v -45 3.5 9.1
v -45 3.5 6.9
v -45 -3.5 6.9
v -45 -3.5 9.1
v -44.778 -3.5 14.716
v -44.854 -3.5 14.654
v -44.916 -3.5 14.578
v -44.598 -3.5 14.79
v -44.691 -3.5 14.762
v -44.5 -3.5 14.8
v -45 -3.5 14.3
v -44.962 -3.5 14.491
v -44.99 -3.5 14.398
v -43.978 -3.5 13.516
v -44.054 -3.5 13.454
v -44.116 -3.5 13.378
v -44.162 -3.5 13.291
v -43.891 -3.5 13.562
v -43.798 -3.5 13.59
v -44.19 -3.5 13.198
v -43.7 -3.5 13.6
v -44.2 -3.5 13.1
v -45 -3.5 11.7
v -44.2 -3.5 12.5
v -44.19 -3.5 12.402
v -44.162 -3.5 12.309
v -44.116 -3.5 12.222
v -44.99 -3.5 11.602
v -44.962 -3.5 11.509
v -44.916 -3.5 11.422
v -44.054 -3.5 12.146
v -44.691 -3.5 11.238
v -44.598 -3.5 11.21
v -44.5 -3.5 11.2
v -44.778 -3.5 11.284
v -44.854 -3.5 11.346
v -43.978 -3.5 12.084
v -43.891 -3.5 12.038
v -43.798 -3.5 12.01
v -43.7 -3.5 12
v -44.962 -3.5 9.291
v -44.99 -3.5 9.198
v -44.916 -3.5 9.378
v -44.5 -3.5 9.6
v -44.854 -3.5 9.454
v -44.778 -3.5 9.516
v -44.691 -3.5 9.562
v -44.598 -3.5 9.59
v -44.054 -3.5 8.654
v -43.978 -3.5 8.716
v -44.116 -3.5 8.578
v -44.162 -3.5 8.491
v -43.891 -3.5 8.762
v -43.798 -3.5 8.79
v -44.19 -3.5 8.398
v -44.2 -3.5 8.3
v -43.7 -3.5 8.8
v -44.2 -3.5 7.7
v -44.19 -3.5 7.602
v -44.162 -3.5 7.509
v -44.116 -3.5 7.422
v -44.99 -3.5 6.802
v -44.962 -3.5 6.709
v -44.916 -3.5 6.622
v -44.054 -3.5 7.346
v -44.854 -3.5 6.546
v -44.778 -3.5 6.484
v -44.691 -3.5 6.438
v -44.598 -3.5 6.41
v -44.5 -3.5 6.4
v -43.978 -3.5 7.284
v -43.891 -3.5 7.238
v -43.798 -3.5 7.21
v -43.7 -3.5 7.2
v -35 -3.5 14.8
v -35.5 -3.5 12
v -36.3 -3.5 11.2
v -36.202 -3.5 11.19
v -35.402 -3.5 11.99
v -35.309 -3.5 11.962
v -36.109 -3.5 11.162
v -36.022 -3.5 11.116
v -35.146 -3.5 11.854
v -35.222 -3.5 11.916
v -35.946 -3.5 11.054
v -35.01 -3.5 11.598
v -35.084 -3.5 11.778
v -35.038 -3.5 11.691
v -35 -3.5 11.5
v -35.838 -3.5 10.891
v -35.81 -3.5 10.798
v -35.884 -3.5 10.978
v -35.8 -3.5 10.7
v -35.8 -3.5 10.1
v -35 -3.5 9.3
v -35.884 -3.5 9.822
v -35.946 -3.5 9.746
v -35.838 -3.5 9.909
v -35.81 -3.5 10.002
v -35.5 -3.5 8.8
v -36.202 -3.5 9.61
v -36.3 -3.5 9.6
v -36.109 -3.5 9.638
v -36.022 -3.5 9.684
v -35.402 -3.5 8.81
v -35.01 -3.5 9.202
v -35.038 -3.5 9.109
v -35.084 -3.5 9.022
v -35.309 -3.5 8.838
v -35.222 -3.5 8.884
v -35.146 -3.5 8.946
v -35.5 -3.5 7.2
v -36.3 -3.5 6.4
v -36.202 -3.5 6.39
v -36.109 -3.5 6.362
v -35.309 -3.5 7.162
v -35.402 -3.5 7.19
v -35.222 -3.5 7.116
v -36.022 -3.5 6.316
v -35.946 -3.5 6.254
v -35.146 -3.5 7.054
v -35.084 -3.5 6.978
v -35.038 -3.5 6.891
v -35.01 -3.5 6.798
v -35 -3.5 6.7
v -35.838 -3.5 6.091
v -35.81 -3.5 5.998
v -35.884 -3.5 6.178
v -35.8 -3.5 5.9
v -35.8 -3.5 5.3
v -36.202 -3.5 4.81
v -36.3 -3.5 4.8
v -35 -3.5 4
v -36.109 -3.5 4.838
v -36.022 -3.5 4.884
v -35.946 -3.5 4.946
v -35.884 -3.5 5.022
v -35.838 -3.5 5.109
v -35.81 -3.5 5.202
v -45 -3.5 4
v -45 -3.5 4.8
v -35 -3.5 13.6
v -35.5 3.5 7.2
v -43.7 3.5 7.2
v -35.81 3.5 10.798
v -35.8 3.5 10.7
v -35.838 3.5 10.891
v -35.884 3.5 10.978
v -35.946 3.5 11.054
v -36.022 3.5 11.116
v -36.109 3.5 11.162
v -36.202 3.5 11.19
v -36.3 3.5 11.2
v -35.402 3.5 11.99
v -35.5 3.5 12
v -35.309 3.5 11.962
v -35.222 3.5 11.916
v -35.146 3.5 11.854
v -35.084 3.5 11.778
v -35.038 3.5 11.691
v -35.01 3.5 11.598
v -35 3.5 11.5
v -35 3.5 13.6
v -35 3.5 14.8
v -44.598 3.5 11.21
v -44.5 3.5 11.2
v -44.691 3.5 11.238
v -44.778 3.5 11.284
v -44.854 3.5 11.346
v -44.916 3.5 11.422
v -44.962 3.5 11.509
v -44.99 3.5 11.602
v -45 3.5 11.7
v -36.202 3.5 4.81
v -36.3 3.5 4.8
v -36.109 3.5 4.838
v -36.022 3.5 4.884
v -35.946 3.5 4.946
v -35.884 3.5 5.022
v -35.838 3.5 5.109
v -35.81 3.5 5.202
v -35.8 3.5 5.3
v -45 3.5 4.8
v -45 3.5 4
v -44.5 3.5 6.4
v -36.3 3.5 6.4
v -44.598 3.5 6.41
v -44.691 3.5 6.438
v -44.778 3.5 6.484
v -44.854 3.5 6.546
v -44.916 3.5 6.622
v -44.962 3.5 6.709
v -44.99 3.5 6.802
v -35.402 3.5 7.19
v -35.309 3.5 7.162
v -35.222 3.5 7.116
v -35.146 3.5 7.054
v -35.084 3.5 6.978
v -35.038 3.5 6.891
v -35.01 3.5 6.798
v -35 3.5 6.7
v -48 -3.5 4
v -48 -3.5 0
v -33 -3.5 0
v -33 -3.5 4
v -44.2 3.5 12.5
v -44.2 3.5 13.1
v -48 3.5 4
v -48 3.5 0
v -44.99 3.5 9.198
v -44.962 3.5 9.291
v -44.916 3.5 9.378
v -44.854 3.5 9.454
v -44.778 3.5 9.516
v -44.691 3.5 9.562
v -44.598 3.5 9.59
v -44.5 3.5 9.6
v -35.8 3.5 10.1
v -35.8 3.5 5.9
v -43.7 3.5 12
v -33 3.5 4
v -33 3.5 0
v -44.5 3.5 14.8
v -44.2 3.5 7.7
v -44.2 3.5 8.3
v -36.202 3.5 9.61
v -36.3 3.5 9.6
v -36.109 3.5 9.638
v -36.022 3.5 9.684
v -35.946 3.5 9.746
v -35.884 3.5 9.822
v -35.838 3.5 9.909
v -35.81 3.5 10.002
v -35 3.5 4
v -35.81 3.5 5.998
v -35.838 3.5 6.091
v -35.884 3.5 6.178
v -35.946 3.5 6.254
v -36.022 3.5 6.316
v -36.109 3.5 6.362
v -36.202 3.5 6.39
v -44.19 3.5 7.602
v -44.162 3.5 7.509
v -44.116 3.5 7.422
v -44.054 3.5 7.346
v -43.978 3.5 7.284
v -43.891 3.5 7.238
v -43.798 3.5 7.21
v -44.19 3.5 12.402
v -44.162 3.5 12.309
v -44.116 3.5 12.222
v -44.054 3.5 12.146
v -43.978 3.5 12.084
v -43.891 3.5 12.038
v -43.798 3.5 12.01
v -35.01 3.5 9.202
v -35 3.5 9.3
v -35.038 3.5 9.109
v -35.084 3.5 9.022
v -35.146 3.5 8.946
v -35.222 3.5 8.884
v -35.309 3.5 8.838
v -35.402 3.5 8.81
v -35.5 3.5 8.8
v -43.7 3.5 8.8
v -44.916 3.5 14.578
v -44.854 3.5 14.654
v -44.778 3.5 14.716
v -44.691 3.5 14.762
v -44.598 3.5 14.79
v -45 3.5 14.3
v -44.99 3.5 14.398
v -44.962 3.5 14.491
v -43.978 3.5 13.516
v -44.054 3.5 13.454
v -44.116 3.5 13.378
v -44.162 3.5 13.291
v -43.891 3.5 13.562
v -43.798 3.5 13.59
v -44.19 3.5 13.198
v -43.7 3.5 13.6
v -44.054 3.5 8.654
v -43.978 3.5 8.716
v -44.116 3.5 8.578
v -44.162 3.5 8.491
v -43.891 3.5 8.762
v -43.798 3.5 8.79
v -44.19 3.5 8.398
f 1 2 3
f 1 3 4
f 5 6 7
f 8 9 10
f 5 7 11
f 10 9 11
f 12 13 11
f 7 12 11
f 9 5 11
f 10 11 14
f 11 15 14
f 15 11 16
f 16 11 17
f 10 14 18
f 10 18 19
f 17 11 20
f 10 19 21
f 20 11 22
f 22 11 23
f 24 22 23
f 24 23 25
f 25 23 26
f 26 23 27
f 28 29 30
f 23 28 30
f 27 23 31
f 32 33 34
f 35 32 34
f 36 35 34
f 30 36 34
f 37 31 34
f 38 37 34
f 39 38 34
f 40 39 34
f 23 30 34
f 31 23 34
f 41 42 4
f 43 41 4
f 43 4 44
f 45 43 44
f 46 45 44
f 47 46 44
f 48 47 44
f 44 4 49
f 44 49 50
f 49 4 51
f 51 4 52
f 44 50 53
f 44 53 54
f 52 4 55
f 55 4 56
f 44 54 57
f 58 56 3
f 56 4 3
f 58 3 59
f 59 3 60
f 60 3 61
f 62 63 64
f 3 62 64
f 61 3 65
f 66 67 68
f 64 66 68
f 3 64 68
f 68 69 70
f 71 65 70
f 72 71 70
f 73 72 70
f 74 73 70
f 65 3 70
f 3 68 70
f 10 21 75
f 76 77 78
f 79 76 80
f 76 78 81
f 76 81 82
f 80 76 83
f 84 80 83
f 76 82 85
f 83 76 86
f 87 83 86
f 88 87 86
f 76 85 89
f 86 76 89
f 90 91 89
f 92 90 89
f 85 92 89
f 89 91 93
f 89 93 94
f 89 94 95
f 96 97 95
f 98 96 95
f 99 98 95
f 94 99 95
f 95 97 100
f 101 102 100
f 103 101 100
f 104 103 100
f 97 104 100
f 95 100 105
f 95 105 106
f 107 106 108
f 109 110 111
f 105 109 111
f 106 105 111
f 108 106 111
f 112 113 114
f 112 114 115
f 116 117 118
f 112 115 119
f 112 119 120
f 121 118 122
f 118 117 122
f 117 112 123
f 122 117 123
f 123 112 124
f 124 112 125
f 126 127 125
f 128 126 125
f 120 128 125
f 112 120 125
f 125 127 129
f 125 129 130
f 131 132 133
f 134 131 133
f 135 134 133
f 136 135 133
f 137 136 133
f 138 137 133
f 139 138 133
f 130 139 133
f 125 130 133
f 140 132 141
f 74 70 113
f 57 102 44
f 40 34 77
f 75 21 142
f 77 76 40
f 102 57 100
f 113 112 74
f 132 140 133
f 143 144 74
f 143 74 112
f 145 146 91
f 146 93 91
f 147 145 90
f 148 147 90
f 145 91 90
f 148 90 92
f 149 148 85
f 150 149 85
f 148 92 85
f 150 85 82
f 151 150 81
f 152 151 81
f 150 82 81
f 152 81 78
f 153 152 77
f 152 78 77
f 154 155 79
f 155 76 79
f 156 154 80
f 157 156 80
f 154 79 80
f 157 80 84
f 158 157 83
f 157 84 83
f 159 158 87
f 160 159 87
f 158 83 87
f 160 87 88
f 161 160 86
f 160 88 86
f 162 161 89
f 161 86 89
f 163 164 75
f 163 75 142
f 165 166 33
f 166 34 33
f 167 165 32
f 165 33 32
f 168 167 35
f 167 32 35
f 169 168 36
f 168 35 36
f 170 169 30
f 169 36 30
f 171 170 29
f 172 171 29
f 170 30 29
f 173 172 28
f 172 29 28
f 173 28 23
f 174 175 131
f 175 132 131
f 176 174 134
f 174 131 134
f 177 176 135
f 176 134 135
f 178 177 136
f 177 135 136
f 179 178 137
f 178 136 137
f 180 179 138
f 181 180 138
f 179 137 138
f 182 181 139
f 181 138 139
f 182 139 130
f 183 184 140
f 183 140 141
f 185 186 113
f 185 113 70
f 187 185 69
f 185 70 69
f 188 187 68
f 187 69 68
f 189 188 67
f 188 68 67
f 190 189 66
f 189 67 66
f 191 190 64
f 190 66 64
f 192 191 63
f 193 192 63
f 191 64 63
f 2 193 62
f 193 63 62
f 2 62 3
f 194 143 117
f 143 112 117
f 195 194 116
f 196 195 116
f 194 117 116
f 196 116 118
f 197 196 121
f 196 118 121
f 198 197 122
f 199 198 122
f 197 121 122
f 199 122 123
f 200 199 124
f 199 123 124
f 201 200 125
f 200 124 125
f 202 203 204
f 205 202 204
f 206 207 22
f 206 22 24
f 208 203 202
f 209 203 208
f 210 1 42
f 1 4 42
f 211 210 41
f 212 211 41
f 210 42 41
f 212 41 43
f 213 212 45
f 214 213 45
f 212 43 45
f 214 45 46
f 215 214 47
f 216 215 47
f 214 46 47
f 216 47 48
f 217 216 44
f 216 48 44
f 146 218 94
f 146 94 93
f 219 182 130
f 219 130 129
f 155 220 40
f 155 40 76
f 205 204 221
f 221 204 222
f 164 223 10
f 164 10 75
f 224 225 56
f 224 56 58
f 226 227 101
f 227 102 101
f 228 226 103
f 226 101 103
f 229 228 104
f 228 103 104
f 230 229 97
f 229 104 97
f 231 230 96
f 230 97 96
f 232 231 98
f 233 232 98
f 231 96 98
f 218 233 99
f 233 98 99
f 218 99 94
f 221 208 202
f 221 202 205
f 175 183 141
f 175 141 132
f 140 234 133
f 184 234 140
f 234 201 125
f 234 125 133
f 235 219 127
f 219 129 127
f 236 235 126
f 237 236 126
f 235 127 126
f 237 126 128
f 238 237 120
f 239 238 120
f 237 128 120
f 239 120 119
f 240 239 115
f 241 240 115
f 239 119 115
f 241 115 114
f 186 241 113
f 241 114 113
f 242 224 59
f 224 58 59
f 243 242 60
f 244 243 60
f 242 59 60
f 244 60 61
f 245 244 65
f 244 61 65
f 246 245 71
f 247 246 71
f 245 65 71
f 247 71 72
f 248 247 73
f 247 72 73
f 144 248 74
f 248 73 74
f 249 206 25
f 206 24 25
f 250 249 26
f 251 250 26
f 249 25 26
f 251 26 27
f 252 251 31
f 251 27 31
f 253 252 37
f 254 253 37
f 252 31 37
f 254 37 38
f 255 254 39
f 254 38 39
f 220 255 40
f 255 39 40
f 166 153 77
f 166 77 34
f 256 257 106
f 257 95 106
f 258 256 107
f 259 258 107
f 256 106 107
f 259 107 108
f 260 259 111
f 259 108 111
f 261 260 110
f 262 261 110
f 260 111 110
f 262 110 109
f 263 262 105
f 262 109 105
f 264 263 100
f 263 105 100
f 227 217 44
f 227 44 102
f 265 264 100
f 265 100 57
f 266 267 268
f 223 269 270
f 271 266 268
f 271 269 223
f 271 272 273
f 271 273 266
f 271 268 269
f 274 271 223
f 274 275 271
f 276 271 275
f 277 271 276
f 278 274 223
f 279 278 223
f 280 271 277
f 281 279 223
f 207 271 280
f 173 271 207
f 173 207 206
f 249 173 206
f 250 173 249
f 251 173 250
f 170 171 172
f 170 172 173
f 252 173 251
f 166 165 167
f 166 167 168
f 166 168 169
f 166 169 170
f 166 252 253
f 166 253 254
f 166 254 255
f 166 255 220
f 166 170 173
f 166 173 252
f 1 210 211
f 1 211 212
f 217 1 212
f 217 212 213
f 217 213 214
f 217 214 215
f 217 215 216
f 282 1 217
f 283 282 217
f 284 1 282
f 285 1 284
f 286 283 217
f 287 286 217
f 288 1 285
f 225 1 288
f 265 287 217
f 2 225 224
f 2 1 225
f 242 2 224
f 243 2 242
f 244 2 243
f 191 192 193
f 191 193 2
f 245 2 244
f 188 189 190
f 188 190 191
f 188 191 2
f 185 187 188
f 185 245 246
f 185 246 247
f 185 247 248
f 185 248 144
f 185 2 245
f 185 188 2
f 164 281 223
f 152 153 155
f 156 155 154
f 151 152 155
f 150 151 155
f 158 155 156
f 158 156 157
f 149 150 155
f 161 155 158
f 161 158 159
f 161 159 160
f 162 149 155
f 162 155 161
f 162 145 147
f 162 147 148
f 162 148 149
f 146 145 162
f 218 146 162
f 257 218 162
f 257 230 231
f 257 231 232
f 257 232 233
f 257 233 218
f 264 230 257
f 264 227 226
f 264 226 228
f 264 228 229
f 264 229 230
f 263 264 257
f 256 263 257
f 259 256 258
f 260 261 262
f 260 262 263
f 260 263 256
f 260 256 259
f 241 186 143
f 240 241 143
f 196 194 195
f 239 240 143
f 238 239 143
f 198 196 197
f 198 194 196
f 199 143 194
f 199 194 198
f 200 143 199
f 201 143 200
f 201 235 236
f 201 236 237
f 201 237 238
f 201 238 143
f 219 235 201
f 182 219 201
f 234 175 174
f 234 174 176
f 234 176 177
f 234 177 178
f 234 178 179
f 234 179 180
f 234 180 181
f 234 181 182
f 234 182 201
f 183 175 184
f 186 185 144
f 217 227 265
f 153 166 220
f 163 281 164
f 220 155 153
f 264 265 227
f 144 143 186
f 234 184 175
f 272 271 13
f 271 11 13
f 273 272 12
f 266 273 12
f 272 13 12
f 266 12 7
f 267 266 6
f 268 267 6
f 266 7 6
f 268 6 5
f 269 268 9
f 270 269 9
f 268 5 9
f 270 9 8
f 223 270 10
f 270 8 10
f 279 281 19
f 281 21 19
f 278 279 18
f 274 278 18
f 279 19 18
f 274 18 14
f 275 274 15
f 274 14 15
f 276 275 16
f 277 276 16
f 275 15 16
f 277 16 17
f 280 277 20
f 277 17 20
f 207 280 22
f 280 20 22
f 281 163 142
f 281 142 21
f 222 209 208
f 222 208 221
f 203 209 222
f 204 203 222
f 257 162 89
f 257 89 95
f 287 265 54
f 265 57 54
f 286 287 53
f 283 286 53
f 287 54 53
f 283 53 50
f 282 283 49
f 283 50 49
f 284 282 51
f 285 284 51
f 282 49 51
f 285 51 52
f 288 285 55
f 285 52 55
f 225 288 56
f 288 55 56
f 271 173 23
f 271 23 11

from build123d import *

# Parameters (mm, degrees)
SKETCH_1_W      = 15
SKETCH_1_H      = 7
EXTRUDE_1_DEPTH = 4
EXTRUDE_2_DEPTH = 7
FILLET_1_R      = 0.5


with BuildPart() as part:
    # 스케치1 → 보스-돌출1 (new body)
    with BuildSketch(Plane.XY):
        with Locations((-40.5, 0)):
            Rectangle(SKETCH_1_W, SKETCH_1_H)
    extrude(amount=EXTRUDE_1_DEPTH)


with BuildPart() as body_2:
    # 스케치2 → 보스-돌출2 (new body)
    with BuildSketch(Plane(origin=(0, 3.5, 0), x_dir=(1, 0, 0), z_dir=(0, 1, 0))):
        Polygon((-35, -4), (-45, -4), (-45, -4.8), (-35.8, -4.8), (-35.8, -6.4), (-45, -6.4), (-45, -9.6), (-35.8, -9.6), (-35.8, -11.2), (-45, -11.2), (-45, -12), (-45, -14.8), (-35, -14.8), (-35, -13.6), (-44.2, -13.6), (-44.2, -12), (-35, -12), (-35, -9.6), (-35, -8.8), (-44.2, -8.8), (-44.2, -7.2), (-35, -7.2), align=None)
    extrude(amount=-EXTRUDE_2_DEPTH)

    # 필렛1
    fillet_1_edges = [body_2.edges().sort_by_distance(p)[0] for p in [
        (-35, 0, 7.2),
        (-44.2, 0, 7.2),
        (-44.2, 0, 8.8),
        (-35, 0, 8.8),
        (-35, 0, 12),
        (-44.2, 0, 12),
        (-44.2, 0, 13.6),
        (-45, 0, 14.8),
        (-45, 0, 11.2),
        (-35.8, 0, 11.2),
        (-35.8, 0, 9.6),
        (-45, 0, 9.6),
        (-45, 0, 6.4),
        (-35.8, 0, 6.4),
        (-35.8, 0, 4.8),
    ]]
    fillet(fillet_1_edges, radius=FILLET_1_R)


solid = Compound([part.part, body_2.part])
